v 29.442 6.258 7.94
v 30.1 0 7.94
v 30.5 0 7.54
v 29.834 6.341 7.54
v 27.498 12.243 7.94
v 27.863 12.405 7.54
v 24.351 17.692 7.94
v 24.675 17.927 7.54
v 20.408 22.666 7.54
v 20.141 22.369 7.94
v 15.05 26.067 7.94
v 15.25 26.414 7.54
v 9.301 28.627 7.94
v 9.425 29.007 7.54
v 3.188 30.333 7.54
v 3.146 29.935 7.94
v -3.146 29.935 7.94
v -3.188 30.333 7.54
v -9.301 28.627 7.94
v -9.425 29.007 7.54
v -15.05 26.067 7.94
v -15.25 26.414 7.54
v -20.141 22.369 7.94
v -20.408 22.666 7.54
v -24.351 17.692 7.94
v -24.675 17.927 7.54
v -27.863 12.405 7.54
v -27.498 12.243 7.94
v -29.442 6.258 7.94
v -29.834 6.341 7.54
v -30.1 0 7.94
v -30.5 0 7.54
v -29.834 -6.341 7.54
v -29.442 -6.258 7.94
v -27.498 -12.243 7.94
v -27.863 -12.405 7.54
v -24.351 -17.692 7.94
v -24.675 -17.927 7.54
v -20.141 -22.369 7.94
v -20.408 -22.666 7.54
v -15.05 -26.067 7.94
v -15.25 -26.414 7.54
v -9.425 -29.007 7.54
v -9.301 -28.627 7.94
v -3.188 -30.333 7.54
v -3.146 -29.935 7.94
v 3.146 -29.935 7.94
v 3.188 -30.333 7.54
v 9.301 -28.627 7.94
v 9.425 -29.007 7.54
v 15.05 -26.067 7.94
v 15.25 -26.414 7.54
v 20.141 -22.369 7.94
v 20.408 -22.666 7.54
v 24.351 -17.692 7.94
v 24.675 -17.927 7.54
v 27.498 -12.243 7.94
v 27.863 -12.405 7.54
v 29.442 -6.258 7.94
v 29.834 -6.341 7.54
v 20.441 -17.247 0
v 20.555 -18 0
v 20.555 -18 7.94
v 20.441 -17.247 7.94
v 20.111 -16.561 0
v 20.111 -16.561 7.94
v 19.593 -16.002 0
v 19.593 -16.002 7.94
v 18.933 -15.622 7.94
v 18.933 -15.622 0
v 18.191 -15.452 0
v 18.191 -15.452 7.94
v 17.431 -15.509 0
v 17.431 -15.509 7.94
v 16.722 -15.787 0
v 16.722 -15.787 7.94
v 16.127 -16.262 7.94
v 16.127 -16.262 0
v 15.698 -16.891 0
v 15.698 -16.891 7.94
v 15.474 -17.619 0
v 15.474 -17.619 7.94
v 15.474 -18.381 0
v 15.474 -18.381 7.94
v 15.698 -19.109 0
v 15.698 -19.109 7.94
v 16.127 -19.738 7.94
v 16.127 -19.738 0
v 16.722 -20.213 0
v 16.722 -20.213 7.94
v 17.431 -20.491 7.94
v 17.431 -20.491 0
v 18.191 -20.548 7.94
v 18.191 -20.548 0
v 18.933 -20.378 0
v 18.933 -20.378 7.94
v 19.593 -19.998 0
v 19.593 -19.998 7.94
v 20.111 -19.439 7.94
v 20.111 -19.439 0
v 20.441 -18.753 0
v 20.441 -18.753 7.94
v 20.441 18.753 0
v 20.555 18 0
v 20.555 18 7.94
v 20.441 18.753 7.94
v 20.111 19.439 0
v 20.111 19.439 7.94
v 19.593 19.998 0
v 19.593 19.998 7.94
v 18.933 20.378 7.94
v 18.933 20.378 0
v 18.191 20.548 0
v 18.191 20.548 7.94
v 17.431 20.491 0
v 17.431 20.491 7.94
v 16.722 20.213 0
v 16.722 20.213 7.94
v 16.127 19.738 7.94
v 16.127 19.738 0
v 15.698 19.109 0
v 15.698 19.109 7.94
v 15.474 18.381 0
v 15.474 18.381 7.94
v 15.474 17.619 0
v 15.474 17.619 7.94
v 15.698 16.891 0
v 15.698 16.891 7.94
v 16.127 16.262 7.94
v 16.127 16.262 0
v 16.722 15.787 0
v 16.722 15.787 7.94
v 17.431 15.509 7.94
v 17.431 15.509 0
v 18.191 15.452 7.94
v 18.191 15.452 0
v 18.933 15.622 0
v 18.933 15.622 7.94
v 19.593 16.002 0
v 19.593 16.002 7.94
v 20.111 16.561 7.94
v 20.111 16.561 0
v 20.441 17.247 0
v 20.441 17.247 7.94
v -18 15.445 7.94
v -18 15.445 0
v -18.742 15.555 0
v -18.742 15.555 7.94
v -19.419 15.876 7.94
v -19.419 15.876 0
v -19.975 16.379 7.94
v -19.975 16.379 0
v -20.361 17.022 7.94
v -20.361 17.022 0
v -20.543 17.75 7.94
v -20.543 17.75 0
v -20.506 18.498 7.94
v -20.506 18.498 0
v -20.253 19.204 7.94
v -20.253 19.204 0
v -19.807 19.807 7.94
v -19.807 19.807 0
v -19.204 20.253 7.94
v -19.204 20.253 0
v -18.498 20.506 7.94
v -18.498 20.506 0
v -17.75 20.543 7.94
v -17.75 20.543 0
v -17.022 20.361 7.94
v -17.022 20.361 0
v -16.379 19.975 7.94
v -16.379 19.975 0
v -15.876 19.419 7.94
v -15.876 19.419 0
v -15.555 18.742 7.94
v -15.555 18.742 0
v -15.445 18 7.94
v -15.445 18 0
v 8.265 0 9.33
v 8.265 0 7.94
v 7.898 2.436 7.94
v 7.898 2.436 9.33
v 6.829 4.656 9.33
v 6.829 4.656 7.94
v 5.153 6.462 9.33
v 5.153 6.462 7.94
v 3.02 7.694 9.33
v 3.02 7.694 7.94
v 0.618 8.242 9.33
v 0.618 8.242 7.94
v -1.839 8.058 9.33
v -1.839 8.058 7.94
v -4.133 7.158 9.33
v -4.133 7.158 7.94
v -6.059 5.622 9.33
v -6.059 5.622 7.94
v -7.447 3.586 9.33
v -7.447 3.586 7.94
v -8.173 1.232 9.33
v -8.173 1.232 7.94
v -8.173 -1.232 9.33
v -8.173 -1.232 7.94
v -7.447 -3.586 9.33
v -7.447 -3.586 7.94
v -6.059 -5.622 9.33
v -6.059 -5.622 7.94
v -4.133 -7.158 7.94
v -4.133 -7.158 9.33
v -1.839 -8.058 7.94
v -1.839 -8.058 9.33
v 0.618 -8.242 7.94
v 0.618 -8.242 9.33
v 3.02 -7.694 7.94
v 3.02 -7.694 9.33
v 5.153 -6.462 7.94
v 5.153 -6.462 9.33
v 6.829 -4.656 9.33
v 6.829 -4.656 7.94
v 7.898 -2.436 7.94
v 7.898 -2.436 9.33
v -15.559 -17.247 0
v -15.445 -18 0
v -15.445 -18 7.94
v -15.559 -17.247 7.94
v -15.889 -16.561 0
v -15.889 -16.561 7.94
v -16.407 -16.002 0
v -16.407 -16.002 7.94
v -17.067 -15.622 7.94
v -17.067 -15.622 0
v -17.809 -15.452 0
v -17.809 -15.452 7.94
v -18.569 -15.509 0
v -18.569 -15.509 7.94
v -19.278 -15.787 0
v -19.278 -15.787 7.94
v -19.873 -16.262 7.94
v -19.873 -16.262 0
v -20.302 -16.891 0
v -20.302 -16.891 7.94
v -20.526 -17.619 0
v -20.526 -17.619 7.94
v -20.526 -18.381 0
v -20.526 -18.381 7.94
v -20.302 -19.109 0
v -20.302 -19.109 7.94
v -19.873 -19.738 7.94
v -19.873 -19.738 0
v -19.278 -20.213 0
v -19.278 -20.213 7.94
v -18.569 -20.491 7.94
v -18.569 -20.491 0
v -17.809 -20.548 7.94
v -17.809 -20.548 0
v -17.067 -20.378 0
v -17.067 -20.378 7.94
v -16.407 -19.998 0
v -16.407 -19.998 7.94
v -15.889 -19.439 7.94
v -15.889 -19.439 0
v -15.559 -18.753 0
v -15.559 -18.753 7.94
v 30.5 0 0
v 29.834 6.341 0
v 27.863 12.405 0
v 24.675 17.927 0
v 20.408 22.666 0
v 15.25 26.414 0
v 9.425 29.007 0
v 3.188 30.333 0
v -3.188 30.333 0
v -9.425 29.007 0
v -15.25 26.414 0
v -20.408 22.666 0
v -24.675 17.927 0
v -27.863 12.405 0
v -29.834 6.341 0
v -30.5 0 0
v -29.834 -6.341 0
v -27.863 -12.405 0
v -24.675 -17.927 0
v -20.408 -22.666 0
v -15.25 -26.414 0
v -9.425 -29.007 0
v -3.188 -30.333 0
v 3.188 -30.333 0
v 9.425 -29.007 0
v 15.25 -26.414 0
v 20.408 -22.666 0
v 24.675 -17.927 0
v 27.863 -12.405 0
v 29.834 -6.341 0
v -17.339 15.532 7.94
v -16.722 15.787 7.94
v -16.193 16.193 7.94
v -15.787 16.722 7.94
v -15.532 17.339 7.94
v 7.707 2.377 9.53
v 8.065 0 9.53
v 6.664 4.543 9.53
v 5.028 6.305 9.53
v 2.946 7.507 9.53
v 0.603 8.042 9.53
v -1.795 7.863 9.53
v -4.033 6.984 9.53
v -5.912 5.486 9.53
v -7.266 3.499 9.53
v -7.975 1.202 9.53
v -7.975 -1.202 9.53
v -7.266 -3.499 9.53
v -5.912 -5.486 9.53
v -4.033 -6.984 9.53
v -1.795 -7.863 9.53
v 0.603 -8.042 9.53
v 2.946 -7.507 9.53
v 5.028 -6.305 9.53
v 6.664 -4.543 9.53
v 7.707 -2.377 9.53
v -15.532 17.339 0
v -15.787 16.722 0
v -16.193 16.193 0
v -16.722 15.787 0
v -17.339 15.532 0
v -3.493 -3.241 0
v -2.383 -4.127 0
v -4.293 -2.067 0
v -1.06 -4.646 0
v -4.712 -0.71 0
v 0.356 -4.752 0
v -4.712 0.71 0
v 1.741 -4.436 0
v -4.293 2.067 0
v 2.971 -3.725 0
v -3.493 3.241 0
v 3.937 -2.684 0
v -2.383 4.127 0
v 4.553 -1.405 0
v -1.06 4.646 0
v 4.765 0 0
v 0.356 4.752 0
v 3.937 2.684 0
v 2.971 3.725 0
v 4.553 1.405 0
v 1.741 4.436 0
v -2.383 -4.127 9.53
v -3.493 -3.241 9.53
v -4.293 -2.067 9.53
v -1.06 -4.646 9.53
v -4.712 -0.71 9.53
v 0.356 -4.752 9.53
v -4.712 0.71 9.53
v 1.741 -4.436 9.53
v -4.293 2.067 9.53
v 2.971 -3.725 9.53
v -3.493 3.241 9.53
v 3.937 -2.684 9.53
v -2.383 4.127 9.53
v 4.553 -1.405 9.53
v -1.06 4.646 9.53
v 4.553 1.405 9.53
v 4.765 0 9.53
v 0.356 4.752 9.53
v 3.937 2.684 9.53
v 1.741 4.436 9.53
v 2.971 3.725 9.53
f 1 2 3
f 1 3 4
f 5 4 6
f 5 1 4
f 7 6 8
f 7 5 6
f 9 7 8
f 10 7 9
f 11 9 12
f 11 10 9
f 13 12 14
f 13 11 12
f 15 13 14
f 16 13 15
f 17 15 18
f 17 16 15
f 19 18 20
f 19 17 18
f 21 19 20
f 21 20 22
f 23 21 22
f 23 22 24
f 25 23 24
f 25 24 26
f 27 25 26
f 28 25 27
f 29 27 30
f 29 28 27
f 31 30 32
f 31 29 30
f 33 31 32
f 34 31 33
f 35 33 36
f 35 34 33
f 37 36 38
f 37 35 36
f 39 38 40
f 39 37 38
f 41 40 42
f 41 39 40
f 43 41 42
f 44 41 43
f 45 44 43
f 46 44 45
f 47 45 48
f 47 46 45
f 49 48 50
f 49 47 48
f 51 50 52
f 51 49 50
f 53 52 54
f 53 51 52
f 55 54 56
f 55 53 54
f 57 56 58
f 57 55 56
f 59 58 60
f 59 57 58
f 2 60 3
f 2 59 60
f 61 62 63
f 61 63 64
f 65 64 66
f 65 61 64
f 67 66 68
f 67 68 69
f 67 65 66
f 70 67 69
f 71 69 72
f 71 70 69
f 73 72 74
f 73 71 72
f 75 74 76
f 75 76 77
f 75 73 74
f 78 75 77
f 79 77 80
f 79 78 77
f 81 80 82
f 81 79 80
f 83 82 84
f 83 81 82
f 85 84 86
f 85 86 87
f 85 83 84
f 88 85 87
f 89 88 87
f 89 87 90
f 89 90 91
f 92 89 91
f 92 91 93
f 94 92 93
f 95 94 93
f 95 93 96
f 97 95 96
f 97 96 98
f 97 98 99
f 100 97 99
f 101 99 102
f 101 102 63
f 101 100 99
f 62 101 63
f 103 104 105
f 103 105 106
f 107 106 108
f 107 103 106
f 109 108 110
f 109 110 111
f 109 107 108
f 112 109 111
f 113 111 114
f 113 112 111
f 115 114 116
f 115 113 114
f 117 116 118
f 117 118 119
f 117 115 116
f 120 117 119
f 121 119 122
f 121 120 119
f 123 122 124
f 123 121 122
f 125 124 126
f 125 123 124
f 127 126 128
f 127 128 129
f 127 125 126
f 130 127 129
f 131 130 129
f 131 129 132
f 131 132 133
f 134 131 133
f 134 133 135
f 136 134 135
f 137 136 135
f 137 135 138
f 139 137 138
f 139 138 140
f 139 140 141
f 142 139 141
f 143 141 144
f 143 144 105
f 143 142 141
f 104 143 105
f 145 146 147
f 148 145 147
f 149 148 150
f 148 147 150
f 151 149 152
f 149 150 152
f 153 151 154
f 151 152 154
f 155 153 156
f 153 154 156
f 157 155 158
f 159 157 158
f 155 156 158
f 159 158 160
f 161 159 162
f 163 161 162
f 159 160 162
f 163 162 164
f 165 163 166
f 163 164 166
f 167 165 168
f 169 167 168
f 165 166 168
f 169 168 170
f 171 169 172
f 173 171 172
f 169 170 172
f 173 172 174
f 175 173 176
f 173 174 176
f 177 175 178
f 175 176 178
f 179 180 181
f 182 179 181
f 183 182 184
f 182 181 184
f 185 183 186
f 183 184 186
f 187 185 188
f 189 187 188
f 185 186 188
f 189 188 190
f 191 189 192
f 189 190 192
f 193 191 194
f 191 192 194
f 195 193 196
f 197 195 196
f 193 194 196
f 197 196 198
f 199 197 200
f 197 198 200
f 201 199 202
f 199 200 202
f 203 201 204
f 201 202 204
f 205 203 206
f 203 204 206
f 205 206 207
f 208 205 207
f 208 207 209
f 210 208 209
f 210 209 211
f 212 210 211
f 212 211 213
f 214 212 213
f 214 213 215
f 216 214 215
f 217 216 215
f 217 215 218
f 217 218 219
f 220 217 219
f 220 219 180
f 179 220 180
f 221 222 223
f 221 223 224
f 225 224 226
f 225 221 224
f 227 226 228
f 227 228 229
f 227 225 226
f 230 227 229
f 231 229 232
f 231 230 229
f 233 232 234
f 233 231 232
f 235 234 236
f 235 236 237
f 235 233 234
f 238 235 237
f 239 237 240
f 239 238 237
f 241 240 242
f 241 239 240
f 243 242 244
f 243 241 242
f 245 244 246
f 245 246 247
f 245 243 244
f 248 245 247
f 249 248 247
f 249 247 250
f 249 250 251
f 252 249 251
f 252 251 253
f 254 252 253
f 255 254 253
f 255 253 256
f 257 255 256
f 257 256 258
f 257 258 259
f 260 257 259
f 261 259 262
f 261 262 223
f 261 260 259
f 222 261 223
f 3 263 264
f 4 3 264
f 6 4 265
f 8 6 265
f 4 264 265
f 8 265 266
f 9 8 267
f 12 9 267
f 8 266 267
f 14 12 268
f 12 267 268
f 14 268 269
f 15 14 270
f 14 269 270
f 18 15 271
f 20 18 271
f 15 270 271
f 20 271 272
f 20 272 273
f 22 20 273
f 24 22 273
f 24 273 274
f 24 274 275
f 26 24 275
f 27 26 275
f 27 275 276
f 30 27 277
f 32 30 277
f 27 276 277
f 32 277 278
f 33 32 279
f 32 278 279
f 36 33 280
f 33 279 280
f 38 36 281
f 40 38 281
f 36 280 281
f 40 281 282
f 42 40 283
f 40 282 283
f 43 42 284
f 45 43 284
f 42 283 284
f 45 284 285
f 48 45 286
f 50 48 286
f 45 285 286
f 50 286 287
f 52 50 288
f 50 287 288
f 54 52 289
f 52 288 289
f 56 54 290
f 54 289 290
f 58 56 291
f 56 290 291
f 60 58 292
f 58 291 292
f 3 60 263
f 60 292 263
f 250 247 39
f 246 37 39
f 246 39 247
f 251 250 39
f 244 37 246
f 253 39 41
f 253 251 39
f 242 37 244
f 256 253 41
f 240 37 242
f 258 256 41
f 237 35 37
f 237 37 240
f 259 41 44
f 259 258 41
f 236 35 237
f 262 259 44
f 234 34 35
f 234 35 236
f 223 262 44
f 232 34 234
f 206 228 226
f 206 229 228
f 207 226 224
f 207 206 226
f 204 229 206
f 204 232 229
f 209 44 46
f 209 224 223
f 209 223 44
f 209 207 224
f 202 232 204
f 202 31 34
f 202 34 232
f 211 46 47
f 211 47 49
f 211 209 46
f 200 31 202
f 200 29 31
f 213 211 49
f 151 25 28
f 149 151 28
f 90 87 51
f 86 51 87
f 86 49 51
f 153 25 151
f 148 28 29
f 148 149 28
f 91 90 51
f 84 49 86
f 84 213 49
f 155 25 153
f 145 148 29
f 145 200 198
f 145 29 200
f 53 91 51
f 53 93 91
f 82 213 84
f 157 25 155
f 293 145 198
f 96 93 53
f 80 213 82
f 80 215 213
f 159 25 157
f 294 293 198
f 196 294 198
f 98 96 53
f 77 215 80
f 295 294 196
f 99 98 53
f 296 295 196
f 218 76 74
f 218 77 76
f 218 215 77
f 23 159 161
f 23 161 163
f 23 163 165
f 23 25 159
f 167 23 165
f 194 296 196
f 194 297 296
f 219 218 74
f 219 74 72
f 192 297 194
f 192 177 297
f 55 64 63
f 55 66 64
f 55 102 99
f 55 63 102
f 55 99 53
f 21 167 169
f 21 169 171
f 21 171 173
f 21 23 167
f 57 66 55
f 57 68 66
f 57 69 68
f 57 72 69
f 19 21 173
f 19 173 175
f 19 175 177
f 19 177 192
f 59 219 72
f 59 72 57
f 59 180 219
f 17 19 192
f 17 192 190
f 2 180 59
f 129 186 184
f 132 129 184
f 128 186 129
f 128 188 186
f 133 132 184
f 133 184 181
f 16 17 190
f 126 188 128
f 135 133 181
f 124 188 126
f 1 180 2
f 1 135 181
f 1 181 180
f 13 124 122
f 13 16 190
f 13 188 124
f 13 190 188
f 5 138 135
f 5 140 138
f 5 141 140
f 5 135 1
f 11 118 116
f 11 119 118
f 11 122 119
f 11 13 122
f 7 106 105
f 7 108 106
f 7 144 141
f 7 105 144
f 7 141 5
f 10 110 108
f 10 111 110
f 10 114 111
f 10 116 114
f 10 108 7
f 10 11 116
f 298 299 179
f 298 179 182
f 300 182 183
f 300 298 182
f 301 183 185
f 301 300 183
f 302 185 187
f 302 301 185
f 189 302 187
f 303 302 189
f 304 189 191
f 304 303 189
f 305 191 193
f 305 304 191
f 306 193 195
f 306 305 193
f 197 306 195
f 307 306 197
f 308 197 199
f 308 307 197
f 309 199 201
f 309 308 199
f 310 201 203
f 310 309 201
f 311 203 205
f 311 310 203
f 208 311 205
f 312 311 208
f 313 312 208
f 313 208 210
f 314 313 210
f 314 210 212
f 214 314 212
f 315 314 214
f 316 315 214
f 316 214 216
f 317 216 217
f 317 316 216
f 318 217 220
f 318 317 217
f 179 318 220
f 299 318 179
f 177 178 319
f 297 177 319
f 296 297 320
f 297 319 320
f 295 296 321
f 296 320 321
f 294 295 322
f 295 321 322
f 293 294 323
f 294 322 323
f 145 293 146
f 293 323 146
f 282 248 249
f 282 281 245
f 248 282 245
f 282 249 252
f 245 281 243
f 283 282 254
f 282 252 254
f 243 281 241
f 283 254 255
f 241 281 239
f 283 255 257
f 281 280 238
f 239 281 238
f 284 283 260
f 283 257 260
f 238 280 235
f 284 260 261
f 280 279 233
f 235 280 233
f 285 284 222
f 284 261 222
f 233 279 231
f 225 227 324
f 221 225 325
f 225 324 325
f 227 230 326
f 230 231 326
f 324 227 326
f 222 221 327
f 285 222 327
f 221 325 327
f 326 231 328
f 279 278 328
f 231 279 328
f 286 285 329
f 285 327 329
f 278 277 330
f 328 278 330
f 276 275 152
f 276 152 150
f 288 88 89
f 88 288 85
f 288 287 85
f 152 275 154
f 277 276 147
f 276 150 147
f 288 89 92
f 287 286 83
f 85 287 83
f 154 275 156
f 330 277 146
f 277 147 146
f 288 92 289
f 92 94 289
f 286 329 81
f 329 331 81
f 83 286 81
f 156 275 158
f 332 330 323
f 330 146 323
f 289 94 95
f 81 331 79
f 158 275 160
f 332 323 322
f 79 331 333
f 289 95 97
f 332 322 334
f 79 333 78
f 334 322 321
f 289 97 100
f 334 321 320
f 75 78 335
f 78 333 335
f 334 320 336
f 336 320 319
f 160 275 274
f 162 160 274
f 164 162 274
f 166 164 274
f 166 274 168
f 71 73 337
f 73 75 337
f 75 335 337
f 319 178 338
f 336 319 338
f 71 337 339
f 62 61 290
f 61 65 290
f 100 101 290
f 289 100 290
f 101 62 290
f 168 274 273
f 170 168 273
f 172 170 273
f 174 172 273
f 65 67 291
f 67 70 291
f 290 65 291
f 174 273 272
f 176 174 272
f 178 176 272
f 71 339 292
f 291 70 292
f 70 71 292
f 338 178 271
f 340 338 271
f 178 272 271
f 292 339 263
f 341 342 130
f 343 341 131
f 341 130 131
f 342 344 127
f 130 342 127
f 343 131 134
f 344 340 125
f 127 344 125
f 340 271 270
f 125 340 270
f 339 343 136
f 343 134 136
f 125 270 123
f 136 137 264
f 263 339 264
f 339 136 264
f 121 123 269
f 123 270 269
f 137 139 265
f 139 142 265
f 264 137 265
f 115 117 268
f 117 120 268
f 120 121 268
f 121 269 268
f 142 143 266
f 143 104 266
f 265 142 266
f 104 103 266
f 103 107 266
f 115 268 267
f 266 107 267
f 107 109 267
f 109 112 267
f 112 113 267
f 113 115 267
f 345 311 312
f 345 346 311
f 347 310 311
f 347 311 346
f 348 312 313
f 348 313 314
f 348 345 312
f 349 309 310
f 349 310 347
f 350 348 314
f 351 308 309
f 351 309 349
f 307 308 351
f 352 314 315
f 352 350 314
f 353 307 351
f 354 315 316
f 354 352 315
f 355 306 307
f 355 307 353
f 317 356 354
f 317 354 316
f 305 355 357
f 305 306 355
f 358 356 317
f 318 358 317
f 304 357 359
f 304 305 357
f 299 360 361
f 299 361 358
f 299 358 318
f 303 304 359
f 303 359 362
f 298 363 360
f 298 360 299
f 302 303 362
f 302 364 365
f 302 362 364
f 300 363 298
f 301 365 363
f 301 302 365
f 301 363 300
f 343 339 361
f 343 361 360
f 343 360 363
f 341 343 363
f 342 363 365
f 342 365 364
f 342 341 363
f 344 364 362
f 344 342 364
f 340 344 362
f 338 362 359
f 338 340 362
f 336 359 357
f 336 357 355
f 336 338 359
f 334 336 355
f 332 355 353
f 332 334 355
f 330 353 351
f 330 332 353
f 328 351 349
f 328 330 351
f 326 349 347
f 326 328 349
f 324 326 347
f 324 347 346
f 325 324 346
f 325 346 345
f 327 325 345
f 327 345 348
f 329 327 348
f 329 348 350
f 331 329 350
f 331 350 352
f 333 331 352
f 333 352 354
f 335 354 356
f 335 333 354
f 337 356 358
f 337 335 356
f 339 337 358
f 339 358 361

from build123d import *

# Parameters (mm, degrees)
F0_R     = 30.5
F0_R_2   = 2.555
F0_R_3   = 8.265
F1_DEPTH = 7.94
F2_SIZE  = 0.4
F0_R_4   = 4.765
F3_DEPTH = 9.53
F4_SIZE  = 0.2


with BuildPart() as f1:
    # F0 (on Top) → F1 (new body)
    with BuildSketch(Plane.XY):
        Circle(F0_R)
        with Locations((-18, -18)):
            Circle(F0_R_2, mode=Mode.SUBTRACT)
        with Locations((18, -18)):
            Circle(F0_R_2, mode=Mode.SUBTRACT)
        with BuildLine():
            ThreePointArc((-18, 15.445), (-19.806658, 19.806658), (-15.445, 18))
            ThreePointArc((-15.445, 18), (-16.193342, 16.193342), (-18, 15.445))
        make_face(mode=Mode.SUBTRACT)
        Circle(F0_R_3, mode=Mode.SUBTRACT)
        with Locations((18, 18)):
            Circle(F0_R_2, mode=Mode.SUBTRACT)
    extrude(amount=F1_DEPTH)

    # F2
    f2_edges = [f1.edges().sort_by_distance(p)[0] for p in [
        (-30.5, 0, 7.94),
    ]]
    chamfer(f2_edges, length=F2_SIZE)

    # F0 (on Top) → F3 (join)
    with BuildSketch(Plane.XY):
        Circle(F0_R_3)
        Circle(F0_R_4, mode=Mode.SUBTRACT)
    extrude(amount=F3_DEPTH)

    # F4
    f4_edges = [f1.edges().sort_by_distance(p)[0] for p in [
        (-8.265, 0, 9.53),
    ]]
    chamfer(f4_edges, length=F4_SIZE)


solid = f1.part
